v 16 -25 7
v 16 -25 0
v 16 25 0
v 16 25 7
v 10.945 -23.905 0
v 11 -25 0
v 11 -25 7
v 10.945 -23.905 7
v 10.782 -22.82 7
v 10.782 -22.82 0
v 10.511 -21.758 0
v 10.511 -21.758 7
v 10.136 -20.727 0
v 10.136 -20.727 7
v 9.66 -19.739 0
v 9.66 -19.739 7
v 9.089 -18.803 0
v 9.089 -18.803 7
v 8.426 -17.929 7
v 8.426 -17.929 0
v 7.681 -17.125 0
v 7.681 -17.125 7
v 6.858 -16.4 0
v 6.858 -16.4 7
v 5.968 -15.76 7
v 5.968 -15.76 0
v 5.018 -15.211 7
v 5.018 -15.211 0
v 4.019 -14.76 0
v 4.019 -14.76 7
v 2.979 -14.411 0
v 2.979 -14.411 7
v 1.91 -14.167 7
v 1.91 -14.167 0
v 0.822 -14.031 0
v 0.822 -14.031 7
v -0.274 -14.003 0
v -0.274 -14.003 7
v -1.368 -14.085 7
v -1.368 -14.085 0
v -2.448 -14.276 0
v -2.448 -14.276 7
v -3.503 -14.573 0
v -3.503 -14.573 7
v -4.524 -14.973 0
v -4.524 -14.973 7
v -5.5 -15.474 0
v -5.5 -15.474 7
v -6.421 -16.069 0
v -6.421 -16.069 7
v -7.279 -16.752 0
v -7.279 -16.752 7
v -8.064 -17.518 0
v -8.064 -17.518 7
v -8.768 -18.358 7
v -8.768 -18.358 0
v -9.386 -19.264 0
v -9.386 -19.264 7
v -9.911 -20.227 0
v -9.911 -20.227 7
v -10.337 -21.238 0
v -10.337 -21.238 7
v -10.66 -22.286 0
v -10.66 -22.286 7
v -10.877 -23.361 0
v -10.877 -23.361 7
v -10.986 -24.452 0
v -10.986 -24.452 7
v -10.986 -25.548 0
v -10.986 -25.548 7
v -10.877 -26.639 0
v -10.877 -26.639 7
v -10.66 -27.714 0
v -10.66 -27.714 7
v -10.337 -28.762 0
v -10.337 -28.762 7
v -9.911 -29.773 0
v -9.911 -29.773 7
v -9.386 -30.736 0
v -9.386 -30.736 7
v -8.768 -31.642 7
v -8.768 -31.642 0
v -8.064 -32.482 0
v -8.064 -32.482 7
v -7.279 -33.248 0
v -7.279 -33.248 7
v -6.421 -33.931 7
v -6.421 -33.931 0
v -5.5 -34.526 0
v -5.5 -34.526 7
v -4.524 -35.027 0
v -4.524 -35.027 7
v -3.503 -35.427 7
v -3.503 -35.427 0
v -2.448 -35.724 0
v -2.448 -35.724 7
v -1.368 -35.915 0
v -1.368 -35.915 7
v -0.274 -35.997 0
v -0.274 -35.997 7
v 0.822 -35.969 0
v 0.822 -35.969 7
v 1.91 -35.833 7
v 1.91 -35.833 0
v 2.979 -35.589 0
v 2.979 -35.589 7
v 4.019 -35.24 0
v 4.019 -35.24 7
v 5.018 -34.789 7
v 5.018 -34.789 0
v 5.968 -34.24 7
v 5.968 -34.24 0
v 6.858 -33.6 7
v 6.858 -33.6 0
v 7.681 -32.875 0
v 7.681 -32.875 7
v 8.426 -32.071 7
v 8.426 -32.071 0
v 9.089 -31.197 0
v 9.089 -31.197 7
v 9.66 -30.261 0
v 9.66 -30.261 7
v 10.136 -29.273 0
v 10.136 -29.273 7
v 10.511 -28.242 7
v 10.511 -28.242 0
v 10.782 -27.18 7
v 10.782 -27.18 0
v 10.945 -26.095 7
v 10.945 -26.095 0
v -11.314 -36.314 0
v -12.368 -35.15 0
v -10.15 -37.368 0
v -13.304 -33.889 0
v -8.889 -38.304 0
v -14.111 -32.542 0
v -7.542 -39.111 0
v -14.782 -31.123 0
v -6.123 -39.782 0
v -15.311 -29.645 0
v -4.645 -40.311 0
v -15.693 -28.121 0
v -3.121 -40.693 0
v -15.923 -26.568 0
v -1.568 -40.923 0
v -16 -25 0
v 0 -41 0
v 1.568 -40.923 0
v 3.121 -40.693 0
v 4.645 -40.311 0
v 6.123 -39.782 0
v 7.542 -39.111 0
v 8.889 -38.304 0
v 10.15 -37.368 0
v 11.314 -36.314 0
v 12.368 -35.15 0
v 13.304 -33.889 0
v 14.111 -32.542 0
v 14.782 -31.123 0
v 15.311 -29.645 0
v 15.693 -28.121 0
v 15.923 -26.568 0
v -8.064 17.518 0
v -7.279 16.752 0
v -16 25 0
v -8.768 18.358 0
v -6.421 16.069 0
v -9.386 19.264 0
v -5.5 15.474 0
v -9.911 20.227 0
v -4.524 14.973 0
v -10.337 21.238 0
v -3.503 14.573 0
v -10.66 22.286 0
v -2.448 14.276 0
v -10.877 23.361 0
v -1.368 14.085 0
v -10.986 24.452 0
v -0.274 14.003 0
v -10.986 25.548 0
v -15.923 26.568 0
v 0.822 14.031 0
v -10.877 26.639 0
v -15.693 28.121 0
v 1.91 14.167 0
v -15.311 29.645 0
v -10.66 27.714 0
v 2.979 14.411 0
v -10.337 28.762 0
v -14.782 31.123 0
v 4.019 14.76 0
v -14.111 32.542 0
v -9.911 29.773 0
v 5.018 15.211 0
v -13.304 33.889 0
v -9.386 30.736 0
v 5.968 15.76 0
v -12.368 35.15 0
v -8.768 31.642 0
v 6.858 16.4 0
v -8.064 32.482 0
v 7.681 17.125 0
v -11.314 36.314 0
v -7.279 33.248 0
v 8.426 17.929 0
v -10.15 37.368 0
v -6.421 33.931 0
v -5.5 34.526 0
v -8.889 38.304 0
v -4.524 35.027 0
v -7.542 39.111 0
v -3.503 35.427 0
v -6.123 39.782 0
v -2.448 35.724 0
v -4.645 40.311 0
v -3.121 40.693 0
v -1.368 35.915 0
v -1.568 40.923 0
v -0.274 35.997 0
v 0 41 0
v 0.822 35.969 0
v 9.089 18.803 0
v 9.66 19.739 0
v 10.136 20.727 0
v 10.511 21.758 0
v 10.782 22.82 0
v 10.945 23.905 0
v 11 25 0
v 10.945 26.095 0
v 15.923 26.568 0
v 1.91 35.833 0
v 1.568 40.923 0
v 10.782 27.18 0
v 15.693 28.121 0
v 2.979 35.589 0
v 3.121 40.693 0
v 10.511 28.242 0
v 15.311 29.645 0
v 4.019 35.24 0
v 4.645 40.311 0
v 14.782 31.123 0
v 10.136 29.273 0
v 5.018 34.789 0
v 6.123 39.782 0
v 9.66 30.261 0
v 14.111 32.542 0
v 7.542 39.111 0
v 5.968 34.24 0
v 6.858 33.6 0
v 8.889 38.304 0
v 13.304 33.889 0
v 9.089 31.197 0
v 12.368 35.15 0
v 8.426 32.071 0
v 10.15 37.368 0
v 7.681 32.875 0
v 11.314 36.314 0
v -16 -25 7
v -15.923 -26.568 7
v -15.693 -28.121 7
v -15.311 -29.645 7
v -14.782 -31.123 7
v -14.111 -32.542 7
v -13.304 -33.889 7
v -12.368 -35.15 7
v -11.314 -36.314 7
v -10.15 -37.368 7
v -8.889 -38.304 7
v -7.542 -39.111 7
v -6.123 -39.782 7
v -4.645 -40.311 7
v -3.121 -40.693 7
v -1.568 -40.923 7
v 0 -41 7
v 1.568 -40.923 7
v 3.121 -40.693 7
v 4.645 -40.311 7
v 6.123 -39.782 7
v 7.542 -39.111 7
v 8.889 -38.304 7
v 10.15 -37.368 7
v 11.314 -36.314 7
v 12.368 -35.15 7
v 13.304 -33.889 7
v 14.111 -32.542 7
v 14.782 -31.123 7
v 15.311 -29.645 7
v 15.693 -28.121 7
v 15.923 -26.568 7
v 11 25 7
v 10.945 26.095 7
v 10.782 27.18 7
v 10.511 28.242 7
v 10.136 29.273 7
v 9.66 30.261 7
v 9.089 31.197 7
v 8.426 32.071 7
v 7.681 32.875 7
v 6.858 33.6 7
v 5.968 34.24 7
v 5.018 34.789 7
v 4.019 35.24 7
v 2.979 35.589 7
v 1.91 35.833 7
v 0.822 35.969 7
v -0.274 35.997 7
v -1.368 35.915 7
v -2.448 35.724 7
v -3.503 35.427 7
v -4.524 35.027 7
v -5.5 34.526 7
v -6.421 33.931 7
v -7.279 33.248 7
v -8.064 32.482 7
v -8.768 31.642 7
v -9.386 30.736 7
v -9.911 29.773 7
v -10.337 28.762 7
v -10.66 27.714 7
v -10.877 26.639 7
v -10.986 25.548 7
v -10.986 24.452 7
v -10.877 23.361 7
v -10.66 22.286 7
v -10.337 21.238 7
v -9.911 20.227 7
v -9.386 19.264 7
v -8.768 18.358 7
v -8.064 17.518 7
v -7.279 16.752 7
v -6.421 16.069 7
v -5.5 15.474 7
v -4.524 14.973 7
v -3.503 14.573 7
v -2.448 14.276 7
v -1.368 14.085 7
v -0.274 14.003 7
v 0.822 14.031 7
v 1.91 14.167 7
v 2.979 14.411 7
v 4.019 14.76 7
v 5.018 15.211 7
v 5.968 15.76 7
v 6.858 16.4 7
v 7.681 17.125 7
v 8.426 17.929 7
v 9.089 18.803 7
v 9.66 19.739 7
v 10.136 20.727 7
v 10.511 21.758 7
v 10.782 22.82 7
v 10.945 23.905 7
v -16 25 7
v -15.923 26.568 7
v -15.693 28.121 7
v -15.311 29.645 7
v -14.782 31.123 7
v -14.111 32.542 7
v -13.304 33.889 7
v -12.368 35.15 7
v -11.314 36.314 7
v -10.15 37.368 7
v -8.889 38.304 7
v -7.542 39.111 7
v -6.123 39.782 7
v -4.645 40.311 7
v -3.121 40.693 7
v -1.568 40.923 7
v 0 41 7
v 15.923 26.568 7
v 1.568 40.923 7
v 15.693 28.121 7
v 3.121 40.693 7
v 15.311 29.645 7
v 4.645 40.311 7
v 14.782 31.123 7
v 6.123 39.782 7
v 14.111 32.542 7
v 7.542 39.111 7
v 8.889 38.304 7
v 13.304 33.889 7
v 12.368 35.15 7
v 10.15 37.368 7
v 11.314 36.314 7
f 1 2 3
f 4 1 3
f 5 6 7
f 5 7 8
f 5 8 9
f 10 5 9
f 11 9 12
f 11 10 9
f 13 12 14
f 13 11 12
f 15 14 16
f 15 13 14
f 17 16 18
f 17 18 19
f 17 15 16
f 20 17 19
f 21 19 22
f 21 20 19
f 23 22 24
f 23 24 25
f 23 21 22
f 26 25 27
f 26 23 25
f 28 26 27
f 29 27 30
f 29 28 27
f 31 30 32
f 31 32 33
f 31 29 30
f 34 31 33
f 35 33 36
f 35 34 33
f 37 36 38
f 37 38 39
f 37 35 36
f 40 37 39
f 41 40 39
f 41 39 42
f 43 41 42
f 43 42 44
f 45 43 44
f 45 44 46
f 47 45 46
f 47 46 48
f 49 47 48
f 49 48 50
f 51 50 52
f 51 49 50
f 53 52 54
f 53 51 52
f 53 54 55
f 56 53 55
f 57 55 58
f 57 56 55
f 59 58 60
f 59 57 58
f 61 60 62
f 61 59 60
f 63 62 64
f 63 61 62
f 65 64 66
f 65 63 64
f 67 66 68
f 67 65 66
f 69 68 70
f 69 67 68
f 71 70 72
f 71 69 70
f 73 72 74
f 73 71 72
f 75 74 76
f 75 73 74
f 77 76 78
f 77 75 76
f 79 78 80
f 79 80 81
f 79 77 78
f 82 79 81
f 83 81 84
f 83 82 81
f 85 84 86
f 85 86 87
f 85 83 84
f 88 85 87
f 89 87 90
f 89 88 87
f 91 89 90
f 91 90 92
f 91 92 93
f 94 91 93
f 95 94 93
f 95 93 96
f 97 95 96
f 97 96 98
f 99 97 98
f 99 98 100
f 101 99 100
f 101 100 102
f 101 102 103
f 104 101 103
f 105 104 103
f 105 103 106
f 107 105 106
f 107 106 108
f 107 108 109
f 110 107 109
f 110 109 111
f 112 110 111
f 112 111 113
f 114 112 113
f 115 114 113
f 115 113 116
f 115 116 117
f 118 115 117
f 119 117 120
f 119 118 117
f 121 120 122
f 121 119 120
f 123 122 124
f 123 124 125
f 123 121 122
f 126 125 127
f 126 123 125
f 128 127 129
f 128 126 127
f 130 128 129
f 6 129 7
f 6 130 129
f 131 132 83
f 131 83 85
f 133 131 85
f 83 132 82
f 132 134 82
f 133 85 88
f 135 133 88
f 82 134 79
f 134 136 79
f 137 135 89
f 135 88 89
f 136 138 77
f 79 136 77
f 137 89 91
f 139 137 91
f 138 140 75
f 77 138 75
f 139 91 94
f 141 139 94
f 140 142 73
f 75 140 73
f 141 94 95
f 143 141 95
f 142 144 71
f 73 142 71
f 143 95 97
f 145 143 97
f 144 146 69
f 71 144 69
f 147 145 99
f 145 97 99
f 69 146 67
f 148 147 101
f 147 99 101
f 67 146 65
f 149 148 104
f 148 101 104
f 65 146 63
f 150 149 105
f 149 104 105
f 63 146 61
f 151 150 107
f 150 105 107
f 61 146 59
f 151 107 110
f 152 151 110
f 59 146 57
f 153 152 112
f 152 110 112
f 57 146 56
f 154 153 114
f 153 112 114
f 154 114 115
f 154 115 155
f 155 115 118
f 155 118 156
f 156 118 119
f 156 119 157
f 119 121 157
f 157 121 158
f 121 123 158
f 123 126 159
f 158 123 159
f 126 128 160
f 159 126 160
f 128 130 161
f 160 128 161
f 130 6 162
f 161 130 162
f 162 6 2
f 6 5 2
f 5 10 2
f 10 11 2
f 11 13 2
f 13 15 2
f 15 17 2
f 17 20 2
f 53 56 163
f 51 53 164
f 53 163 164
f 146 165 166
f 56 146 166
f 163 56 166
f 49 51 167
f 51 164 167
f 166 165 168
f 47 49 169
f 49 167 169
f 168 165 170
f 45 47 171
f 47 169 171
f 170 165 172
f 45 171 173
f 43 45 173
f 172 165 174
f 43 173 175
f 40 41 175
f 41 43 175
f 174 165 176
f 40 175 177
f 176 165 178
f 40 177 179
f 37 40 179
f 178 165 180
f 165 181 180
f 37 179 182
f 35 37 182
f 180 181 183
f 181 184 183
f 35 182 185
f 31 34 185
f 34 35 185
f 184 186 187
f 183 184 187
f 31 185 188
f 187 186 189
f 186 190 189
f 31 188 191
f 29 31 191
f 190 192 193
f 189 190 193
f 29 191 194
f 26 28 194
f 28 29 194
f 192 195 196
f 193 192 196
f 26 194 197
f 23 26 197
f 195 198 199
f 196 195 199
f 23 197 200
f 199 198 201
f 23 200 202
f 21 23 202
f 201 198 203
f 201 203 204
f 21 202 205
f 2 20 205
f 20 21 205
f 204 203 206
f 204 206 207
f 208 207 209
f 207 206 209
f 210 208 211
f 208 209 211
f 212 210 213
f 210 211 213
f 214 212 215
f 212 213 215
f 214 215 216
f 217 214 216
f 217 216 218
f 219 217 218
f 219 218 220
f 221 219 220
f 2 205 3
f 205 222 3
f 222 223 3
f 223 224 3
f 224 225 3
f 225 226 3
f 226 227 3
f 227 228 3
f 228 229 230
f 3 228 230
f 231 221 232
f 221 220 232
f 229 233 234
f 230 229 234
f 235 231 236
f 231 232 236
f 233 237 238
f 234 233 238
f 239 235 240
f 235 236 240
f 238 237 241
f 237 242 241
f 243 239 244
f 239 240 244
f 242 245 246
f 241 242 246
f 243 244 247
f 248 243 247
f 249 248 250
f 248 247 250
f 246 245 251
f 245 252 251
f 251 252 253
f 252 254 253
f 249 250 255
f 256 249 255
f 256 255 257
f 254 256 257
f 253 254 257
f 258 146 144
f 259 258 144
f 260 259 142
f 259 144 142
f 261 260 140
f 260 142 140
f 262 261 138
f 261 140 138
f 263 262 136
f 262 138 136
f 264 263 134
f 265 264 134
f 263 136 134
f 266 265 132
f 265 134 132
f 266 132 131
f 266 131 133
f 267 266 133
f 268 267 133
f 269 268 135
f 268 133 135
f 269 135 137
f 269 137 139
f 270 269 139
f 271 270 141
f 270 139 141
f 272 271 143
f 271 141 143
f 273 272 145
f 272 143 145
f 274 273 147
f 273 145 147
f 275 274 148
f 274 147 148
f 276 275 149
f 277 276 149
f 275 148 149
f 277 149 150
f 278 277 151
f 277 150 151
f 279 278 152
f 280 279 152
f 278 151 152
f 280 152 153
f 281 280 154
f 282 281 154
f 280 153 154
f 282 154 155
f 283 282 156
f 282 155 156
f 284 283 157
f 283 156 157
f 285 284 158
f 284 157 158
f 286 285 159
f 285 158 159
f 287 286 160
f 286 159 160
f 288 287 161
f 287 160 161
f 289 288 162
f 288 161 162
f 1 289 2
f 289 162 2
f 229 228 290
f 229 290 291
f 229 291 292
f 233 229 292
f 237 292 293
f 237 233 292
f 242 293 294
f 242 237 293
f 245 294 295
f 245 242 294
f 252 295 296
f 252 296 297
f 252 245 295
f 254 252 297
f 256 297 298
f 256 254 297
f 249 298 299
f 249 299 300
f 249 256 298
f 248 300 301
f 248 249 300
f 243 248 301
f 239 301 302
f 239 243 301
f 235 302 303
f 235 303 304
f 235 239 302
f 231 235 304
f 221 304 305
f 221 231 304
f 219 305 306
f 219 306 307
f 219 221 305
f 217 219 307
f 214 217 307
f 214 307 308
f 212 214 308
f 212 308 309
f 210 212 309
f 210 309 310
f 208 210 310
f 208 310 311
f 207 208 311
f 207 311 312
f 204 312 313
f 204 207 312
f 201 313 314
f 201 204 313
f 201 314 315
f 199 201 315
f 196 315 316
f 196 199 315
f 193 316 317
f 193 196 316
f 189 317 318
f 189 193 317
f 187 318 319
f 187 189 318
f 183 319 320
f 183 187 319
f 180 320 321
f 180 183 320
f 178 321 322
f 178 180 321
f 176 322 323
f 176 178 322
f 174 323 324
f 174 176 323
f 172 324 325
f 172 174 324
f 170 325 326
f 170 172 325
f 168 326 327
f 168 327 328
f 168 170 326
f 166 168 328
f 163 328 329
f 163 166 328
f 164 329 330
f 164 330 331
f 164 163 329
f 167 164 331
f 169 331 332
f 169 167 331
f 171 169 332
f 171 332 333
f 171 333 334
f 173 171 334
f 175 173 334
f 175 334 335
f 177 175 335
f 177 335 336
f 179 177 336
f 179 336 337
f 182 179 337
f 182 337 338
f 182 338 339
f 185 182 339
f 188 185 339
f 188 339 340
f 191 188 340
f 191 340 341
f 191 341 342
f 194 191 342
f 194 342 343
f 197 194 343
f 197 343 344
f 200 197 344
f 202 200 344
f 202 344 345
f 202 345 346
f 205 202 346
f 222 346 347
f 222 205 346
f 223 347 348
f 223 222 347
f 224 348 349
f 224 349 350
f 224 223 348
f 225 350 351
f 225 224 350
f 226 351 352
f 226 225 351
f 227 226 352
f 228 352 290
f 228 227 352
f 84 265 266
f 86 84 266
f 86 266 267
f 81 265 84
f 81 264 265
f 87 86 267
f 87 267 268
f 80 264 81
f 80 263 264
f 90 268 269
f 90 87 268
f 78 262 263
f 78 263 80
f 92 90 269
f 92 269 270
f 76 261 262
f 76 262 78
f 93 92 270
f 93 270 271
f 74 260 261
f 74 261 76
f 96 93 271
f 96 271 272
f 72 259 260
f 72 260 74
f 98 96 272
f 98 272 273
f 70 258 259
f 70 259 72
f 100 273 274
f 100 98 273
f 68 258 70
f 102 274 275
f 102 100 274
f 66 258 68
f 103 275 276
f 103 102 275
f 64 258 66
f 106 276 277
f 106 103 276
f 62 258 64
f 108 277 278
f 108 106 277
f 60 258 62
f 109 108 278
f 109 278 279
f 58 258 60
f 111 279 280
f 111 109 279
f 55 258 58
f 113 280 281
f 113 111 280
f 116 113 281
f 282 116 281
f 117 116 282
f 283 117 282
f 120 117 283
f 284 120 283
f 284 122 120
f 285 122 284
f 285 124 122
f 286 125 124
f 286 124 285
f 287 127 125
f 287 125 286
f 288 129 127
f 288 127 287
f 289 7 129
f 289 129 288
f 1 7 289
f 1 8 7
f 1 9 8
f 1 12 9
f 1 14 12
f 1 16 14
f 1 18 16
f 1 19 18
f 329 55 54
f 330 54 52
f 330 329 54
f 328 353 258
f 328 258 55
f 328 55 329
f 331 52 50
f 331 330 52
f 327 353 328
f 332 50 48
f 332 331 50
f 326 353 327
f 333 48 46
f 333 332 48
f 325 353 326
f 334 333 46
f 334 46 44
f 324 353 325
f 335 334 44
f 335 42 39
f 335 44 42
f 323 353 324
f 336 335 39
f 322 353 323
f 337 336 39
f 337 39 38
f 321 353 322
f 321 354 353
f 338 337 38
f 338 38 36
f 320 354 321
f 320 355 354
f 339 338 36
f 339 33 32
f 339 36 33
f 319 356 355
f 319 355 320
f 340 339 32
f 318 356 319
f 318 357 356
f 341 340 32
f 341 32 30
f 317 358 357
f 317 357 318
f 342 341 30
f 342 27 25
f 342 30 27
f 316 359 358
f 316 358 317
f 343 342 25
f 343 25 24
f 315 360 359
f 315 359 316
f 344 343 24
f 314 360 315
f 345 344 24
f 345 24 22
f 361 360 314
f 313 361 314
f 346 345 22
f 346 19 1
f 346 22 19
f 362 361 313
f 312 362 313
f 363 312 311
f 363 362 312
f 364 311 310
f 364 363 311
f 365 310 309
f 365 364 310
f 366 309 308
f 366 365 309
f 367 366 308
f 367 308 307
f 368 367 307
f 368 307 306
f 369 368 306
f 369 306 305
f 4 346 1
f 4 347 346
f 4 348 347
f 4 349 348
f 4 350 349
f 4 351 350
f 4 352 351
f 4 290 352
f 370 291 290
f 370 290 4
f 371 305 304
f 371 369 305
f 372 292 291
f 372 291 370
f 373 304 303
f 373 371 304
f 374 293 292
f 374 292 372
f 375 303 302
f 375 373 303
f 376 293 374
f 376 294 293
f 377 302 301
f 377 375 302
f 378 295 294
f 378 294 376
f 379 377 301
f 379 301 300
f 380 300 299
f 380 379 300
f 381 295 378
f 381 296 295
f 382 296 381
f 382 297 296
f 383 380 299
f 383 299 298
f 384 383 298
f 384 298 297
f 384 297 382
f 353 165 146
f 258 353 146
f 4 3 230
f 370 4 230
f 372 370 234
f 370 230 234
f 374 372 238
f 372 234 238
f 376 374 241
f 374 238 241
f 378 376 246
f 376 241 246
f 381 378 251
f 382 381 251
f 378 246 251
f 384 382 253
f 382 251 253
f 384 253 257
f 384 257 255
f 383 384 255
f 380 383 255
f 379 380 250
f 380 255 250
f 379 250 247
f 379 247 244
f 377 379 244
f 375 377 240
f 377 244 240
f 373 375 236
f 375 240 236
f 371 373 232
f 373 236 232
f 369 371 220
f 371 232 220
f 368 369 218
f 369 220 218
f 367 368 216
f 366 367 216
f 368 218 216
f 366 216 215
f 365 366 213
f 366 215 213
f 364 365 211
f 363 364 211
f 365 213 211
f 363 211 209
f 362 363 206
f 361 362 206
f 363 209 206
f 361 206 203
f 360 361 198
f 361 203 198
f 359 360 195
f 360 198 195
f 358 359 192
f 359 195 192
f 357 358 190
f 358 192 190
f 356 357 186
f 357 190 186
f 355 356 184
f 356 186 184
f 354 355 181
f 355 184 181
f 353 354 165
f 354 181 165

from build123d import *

# Parameters (mm, degrees)
SKETCH1_R           = 11
BOSS_EXTRUDE1_DEPTH = 7


with BuildPart() as part:
    # Sketch1 → Boss-Extrude1 (new body)
    with BuildSketch(Plane.XY):
        with BuildLine():
            ThreePointArc((16, 25), (0, 41), (-16, 25))
            Line((-16, 25), (-16, -25))
            ThreePointArc((-16, -25), (0, -41), (16, -25))
            Line((16, -25), (16, 25))
        make_face()
        with Locations((0, 25)):
            Circle(SKETCH1_R, mode=Mode.SUBTRACT)
        with Locations((0, -25)):
            Circle(SKETCH1_R, mode=Mode.SUBTRACT)
    extrude(amount=BOSS_EXTRUDE1_DEPTH)


solid = part.part
